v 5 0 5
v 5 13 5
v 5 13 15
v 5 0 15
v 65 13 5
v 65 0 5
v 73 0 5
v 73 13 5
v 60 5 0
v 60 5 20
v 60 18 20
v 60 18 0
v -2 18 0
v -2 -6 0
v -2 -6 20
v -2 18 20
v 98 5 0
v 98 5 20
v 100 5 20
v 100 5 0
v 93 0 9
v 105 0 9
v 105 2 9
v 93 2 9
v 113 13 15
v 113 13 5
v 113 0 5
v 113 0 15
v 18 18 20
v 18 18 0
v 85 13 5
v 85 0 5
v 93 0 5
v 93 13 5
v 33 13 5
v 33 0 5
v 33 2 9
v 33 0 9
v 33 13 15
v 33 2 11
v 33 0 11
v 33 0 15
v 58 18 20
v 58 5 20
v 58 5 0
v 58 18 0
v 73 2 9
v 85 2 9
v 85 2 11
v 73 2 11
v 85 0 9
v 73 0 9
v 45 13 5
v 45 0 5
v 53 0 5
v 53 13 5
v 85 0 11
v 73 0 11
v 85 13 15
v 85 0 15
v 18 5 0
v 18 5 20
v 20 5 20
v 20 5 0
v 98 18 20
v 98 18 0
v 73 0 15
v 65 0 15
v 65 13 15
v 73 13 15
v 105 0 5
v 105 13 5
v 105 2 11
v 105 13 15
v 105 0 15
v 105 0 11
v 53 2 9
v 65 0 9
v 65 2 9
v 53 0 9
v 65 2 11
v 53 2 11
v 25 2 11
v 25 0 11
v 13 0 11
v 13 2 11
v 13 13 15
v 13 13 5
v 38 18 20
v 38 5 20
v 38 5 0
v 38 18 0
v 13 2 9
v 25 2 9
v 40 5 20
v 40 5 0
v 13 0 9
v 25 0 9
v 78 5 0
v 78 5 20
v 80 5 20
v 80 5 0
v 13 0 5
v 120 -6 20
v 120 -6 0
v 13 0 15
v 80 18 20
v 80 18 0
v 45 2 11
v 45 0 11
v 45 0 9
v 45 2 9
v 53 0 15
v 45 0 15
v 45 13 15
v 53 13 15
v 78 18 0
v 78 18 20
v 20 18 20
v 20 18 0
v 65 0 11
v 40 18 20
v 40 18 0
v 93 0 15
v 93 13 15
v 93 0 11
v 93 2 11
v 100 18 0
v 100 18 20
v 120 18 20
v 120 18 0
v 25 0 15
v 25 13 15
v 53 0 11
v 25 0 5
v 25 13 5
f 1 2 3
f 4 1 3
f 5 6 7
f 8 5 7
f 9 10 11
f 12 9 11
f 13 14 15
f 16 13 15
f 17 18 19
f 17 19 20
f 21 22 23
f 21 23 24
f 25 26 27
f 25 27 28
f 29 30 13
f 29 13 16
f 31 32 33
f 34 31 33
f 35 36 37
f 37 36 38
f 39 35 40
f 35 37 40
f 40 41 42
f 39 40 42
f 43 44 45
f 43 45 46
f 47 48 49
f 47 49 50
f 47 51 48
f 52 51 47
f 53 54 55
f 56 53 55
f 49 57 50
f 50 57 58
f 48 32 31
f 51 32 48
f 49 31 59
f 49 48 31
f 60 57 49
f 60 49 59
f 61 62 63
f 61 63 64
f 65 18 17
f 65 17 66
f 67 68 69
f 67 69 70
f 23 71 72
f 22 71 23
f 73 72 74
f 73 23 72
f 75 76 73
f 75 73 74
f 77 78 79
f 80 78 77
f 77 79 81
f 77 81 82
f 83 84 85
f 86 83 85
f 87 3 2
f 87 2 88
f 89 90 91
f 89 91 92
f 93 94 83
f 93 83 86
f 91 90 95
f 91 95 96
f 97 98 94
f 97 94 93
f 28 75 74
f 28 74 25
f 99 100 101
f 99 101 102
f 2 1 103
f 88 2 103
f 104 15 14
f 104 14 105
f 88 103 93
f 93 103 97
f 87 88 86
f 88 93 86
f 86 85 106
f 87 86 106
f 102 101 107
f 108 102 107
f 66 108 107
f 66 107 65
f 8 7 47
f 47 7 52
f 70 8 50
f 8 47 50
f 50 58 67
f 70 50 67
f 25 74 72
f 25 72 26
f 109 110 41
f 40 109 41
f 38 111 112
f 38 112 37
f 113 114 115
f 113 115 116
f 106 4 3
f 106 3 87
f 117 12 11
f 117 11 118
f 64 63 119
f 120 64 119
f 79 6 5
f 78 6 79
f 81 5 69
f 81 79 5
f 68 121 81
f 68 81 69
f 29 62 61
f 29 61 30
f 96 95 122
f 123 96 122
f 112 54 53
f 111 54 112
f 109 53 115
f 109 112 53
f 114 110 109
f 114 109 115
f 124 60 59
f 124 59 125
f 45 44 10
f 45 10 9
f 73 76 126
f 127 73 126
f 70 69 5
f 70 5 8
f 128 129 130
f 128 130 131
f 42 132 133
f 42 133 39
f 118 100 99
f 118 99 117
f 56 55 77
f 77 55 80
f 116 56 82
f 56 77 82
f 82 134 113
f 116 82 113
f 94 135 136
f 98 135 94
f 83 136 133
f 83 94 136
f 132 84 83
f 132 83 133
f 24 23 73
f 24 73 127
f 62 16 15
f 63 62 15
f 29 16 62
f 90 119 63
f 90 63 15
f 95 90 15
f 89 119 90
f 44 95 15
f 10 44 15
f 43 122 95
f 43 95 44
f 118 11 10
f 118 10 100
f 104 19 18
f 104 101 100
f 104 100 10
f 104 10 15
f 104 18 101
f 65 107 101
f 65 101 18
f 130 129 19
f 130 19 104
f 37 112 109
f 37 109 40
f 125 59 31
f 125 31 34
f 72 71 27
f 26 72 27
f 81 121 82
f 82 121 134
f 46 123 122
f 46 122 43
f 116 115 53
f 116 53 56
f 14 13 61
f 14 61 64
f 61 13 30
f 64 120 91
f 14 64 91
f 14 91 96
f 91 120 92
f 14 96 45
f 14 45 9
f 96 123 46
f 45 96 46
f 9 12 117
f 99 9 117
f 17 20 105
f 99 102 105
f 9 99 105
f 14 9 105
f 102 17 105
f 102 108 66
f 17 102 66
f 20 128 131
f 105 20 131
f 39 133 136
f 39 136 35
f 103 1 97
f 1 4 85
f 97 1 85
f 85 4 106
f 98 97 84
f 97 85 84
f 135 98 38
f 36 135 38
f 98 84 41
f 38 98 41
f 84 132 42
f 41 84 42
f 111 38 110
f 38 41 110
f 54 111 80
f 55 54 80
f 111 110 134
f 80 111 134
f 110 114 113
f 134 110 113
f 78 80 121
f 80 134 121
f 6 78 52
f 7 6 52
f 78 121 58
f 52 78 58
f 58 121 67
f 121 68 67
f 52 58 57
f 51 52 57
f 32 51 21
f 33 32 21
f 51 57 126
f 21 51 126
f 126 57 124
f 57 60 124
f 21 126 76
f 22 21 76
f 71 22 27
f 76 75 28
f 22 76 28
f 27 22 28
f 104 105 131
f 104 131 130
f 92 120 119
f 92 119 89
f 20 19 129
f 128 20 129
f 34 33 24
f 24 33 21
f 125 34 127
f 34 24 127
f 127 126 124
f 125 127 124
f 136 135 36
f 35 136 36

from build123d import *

# Parameters (mm, degrees)
SKETCH1_W           = 18
SKETCH1_H           = 18
BOSS_EXTRUDE1_DEPTH = 20
SKETCH2_W           = 8
SKETCH2_H           = 10
CUT_EXTRUDE1_DEPTH  = 13
SKETCH3_W           = 20
SKETCH3_H           = 5
BOSS_EXTRUDE2_DEPTH = 2
LPATTERN1_COUNT     = 6
LPATTERN1_PITCH     = 20
SKETCH4_W           = 20
SKETCH4_H           = 13
BOSS_EXTRUDE3_DEPTH = 2
SKETCH5_W           = 20
SKETCH5_H           = 18
BOSS_EXTRUDE4_DEPTH = 2
SKETCH6_W           = 108
SKETCH6_H           = 2
CUT_EXTRUDE2_DEPTH  = 2
SKETCH7_W           = 122
SKETCH7_H           = 20
BOSS_EXTRUDE5_DEPTH = 6


with BuildPart() as part:
    # Sketch1 → Boss-Extrude1 (new body)
    with BuildSketch(Plane.XY):
        with Locations((9, 9)):
            Rectangle(SKETCH1_W, SKETCH1_H)
    extrude(amount=BOSS_EXTRUDE1_DEPTH)

    # Sketch2 → Cut-Extrude1 (cut)
    with BuildSketch(Plane.XZ):
        with Locations((9, 10)):
            Rectangle(SKETCH2_W, SKETCH2_H)
    extrude(amount=-CUT_EXTRUDE1_DEPTH, mode=Mode.SUBTRACT)

    # Sketch3 → Boss-Extrude2 (add)
    with BuildSketch(Plane(origin=(18, 0, 0), x_dir=(0, 0, -1), z_dir=(1, 0, 0))):
        with Locations((-10, 2.5)):
            Rectangle(SKETCH3_W, SKETCH3_H)
    extrude(amount=BOSS_EXTRUDE2_DEPTH)


with BuildPart() as lpattern1_1:
    # LPattern1: pattern copy
    add(part.part.moved(Location(Vector(1, 0, 0) * (1 * LPATTERN1_PITCH))))


with BuildPart() as lpattern1_2:
    # LPattern1: pattern copy
    add(part.part.moved(Location(Vector(1, 0, 0) * (2 * LPATTERN1_PITCH))))


with BuildPart() as lpattern1_3:
    # LPattern1: pattern copy
    add(part.part.moved(Location(Vector(1, 0, 0) * (3 * LPATTERN1_PITCH))))


with BuildPart() as lpattern1_4:
    # LPattern1: pattern copy
    add(part.part.moved(Location(Vector(1, 0, 0) * (4 * LPATTERN1_PITCH))))


with BuildPart() as lpattern1_5:
    # LPattern1: pattern copy
    add(part.part.moved(Location(Vector(1, 0, 0) * (5 * LPATTERN1_PITCH))))


with BuildPart() as lpattern1_4_1:
    add(lpattern1_4.part)

    # Combine1: union LPattern1_5, part, LPattern1_1, LPattern1_2, LPattern1_3
    add(lpattern1_5.part)
    add(part.part)
    add(lpattern1_1.part)
    add(lpattern1_2.part)
    add(lpattern1_3.part)

    # Sketch4 → Boss-Extrude3 (add)
    with BuildSketch(Plane(origin=(118, 0, 0), x_dir=(0, 0, -1), z_dir=(1, 0, 0))):
        with Locations((-10, 11.5)):
            Rectangle(SKETCH4_W, SKETCH4_H)
    extrude(amount=BOSS_EXTRUDE3_DEPTH)

    # Sketch5 → Boss-Extrude4 (add)
    with BuildSketch(Plane.ZY):
        with Locations((10, 9)):
            Rectangle(SKETCH5_W, SKETCH5_H)
    extrude(amount=BOSS_EXTRUDE4_DEPTH)

    # Sketch6 → Cut-Extrude2 (cut)
    with BuildSketch(Plane(origin=(0, 0, 0), x_dir=(-1, 0, 0), z_dir=(0, -1, 0))):
        with Locations((-59, -10)):
            Rectangle(SKETCH6_W, SKETCH6_H)
    extrude(amount=-CUT_EXTRUDE2_DEPTH, mode=Mode.SUBTRACT)

    # Sketch7 → Boss-Extrude5 (add)
    with BuildSketch(Plane.XZ):
        with Locations((59, 10)):
            Rectangle(SKETCH7_W, SKETCH7_H)
    extrude(amount=BOSS_EXTRUDE5_DEPTH)


solid = lpattern1_4_1.part
